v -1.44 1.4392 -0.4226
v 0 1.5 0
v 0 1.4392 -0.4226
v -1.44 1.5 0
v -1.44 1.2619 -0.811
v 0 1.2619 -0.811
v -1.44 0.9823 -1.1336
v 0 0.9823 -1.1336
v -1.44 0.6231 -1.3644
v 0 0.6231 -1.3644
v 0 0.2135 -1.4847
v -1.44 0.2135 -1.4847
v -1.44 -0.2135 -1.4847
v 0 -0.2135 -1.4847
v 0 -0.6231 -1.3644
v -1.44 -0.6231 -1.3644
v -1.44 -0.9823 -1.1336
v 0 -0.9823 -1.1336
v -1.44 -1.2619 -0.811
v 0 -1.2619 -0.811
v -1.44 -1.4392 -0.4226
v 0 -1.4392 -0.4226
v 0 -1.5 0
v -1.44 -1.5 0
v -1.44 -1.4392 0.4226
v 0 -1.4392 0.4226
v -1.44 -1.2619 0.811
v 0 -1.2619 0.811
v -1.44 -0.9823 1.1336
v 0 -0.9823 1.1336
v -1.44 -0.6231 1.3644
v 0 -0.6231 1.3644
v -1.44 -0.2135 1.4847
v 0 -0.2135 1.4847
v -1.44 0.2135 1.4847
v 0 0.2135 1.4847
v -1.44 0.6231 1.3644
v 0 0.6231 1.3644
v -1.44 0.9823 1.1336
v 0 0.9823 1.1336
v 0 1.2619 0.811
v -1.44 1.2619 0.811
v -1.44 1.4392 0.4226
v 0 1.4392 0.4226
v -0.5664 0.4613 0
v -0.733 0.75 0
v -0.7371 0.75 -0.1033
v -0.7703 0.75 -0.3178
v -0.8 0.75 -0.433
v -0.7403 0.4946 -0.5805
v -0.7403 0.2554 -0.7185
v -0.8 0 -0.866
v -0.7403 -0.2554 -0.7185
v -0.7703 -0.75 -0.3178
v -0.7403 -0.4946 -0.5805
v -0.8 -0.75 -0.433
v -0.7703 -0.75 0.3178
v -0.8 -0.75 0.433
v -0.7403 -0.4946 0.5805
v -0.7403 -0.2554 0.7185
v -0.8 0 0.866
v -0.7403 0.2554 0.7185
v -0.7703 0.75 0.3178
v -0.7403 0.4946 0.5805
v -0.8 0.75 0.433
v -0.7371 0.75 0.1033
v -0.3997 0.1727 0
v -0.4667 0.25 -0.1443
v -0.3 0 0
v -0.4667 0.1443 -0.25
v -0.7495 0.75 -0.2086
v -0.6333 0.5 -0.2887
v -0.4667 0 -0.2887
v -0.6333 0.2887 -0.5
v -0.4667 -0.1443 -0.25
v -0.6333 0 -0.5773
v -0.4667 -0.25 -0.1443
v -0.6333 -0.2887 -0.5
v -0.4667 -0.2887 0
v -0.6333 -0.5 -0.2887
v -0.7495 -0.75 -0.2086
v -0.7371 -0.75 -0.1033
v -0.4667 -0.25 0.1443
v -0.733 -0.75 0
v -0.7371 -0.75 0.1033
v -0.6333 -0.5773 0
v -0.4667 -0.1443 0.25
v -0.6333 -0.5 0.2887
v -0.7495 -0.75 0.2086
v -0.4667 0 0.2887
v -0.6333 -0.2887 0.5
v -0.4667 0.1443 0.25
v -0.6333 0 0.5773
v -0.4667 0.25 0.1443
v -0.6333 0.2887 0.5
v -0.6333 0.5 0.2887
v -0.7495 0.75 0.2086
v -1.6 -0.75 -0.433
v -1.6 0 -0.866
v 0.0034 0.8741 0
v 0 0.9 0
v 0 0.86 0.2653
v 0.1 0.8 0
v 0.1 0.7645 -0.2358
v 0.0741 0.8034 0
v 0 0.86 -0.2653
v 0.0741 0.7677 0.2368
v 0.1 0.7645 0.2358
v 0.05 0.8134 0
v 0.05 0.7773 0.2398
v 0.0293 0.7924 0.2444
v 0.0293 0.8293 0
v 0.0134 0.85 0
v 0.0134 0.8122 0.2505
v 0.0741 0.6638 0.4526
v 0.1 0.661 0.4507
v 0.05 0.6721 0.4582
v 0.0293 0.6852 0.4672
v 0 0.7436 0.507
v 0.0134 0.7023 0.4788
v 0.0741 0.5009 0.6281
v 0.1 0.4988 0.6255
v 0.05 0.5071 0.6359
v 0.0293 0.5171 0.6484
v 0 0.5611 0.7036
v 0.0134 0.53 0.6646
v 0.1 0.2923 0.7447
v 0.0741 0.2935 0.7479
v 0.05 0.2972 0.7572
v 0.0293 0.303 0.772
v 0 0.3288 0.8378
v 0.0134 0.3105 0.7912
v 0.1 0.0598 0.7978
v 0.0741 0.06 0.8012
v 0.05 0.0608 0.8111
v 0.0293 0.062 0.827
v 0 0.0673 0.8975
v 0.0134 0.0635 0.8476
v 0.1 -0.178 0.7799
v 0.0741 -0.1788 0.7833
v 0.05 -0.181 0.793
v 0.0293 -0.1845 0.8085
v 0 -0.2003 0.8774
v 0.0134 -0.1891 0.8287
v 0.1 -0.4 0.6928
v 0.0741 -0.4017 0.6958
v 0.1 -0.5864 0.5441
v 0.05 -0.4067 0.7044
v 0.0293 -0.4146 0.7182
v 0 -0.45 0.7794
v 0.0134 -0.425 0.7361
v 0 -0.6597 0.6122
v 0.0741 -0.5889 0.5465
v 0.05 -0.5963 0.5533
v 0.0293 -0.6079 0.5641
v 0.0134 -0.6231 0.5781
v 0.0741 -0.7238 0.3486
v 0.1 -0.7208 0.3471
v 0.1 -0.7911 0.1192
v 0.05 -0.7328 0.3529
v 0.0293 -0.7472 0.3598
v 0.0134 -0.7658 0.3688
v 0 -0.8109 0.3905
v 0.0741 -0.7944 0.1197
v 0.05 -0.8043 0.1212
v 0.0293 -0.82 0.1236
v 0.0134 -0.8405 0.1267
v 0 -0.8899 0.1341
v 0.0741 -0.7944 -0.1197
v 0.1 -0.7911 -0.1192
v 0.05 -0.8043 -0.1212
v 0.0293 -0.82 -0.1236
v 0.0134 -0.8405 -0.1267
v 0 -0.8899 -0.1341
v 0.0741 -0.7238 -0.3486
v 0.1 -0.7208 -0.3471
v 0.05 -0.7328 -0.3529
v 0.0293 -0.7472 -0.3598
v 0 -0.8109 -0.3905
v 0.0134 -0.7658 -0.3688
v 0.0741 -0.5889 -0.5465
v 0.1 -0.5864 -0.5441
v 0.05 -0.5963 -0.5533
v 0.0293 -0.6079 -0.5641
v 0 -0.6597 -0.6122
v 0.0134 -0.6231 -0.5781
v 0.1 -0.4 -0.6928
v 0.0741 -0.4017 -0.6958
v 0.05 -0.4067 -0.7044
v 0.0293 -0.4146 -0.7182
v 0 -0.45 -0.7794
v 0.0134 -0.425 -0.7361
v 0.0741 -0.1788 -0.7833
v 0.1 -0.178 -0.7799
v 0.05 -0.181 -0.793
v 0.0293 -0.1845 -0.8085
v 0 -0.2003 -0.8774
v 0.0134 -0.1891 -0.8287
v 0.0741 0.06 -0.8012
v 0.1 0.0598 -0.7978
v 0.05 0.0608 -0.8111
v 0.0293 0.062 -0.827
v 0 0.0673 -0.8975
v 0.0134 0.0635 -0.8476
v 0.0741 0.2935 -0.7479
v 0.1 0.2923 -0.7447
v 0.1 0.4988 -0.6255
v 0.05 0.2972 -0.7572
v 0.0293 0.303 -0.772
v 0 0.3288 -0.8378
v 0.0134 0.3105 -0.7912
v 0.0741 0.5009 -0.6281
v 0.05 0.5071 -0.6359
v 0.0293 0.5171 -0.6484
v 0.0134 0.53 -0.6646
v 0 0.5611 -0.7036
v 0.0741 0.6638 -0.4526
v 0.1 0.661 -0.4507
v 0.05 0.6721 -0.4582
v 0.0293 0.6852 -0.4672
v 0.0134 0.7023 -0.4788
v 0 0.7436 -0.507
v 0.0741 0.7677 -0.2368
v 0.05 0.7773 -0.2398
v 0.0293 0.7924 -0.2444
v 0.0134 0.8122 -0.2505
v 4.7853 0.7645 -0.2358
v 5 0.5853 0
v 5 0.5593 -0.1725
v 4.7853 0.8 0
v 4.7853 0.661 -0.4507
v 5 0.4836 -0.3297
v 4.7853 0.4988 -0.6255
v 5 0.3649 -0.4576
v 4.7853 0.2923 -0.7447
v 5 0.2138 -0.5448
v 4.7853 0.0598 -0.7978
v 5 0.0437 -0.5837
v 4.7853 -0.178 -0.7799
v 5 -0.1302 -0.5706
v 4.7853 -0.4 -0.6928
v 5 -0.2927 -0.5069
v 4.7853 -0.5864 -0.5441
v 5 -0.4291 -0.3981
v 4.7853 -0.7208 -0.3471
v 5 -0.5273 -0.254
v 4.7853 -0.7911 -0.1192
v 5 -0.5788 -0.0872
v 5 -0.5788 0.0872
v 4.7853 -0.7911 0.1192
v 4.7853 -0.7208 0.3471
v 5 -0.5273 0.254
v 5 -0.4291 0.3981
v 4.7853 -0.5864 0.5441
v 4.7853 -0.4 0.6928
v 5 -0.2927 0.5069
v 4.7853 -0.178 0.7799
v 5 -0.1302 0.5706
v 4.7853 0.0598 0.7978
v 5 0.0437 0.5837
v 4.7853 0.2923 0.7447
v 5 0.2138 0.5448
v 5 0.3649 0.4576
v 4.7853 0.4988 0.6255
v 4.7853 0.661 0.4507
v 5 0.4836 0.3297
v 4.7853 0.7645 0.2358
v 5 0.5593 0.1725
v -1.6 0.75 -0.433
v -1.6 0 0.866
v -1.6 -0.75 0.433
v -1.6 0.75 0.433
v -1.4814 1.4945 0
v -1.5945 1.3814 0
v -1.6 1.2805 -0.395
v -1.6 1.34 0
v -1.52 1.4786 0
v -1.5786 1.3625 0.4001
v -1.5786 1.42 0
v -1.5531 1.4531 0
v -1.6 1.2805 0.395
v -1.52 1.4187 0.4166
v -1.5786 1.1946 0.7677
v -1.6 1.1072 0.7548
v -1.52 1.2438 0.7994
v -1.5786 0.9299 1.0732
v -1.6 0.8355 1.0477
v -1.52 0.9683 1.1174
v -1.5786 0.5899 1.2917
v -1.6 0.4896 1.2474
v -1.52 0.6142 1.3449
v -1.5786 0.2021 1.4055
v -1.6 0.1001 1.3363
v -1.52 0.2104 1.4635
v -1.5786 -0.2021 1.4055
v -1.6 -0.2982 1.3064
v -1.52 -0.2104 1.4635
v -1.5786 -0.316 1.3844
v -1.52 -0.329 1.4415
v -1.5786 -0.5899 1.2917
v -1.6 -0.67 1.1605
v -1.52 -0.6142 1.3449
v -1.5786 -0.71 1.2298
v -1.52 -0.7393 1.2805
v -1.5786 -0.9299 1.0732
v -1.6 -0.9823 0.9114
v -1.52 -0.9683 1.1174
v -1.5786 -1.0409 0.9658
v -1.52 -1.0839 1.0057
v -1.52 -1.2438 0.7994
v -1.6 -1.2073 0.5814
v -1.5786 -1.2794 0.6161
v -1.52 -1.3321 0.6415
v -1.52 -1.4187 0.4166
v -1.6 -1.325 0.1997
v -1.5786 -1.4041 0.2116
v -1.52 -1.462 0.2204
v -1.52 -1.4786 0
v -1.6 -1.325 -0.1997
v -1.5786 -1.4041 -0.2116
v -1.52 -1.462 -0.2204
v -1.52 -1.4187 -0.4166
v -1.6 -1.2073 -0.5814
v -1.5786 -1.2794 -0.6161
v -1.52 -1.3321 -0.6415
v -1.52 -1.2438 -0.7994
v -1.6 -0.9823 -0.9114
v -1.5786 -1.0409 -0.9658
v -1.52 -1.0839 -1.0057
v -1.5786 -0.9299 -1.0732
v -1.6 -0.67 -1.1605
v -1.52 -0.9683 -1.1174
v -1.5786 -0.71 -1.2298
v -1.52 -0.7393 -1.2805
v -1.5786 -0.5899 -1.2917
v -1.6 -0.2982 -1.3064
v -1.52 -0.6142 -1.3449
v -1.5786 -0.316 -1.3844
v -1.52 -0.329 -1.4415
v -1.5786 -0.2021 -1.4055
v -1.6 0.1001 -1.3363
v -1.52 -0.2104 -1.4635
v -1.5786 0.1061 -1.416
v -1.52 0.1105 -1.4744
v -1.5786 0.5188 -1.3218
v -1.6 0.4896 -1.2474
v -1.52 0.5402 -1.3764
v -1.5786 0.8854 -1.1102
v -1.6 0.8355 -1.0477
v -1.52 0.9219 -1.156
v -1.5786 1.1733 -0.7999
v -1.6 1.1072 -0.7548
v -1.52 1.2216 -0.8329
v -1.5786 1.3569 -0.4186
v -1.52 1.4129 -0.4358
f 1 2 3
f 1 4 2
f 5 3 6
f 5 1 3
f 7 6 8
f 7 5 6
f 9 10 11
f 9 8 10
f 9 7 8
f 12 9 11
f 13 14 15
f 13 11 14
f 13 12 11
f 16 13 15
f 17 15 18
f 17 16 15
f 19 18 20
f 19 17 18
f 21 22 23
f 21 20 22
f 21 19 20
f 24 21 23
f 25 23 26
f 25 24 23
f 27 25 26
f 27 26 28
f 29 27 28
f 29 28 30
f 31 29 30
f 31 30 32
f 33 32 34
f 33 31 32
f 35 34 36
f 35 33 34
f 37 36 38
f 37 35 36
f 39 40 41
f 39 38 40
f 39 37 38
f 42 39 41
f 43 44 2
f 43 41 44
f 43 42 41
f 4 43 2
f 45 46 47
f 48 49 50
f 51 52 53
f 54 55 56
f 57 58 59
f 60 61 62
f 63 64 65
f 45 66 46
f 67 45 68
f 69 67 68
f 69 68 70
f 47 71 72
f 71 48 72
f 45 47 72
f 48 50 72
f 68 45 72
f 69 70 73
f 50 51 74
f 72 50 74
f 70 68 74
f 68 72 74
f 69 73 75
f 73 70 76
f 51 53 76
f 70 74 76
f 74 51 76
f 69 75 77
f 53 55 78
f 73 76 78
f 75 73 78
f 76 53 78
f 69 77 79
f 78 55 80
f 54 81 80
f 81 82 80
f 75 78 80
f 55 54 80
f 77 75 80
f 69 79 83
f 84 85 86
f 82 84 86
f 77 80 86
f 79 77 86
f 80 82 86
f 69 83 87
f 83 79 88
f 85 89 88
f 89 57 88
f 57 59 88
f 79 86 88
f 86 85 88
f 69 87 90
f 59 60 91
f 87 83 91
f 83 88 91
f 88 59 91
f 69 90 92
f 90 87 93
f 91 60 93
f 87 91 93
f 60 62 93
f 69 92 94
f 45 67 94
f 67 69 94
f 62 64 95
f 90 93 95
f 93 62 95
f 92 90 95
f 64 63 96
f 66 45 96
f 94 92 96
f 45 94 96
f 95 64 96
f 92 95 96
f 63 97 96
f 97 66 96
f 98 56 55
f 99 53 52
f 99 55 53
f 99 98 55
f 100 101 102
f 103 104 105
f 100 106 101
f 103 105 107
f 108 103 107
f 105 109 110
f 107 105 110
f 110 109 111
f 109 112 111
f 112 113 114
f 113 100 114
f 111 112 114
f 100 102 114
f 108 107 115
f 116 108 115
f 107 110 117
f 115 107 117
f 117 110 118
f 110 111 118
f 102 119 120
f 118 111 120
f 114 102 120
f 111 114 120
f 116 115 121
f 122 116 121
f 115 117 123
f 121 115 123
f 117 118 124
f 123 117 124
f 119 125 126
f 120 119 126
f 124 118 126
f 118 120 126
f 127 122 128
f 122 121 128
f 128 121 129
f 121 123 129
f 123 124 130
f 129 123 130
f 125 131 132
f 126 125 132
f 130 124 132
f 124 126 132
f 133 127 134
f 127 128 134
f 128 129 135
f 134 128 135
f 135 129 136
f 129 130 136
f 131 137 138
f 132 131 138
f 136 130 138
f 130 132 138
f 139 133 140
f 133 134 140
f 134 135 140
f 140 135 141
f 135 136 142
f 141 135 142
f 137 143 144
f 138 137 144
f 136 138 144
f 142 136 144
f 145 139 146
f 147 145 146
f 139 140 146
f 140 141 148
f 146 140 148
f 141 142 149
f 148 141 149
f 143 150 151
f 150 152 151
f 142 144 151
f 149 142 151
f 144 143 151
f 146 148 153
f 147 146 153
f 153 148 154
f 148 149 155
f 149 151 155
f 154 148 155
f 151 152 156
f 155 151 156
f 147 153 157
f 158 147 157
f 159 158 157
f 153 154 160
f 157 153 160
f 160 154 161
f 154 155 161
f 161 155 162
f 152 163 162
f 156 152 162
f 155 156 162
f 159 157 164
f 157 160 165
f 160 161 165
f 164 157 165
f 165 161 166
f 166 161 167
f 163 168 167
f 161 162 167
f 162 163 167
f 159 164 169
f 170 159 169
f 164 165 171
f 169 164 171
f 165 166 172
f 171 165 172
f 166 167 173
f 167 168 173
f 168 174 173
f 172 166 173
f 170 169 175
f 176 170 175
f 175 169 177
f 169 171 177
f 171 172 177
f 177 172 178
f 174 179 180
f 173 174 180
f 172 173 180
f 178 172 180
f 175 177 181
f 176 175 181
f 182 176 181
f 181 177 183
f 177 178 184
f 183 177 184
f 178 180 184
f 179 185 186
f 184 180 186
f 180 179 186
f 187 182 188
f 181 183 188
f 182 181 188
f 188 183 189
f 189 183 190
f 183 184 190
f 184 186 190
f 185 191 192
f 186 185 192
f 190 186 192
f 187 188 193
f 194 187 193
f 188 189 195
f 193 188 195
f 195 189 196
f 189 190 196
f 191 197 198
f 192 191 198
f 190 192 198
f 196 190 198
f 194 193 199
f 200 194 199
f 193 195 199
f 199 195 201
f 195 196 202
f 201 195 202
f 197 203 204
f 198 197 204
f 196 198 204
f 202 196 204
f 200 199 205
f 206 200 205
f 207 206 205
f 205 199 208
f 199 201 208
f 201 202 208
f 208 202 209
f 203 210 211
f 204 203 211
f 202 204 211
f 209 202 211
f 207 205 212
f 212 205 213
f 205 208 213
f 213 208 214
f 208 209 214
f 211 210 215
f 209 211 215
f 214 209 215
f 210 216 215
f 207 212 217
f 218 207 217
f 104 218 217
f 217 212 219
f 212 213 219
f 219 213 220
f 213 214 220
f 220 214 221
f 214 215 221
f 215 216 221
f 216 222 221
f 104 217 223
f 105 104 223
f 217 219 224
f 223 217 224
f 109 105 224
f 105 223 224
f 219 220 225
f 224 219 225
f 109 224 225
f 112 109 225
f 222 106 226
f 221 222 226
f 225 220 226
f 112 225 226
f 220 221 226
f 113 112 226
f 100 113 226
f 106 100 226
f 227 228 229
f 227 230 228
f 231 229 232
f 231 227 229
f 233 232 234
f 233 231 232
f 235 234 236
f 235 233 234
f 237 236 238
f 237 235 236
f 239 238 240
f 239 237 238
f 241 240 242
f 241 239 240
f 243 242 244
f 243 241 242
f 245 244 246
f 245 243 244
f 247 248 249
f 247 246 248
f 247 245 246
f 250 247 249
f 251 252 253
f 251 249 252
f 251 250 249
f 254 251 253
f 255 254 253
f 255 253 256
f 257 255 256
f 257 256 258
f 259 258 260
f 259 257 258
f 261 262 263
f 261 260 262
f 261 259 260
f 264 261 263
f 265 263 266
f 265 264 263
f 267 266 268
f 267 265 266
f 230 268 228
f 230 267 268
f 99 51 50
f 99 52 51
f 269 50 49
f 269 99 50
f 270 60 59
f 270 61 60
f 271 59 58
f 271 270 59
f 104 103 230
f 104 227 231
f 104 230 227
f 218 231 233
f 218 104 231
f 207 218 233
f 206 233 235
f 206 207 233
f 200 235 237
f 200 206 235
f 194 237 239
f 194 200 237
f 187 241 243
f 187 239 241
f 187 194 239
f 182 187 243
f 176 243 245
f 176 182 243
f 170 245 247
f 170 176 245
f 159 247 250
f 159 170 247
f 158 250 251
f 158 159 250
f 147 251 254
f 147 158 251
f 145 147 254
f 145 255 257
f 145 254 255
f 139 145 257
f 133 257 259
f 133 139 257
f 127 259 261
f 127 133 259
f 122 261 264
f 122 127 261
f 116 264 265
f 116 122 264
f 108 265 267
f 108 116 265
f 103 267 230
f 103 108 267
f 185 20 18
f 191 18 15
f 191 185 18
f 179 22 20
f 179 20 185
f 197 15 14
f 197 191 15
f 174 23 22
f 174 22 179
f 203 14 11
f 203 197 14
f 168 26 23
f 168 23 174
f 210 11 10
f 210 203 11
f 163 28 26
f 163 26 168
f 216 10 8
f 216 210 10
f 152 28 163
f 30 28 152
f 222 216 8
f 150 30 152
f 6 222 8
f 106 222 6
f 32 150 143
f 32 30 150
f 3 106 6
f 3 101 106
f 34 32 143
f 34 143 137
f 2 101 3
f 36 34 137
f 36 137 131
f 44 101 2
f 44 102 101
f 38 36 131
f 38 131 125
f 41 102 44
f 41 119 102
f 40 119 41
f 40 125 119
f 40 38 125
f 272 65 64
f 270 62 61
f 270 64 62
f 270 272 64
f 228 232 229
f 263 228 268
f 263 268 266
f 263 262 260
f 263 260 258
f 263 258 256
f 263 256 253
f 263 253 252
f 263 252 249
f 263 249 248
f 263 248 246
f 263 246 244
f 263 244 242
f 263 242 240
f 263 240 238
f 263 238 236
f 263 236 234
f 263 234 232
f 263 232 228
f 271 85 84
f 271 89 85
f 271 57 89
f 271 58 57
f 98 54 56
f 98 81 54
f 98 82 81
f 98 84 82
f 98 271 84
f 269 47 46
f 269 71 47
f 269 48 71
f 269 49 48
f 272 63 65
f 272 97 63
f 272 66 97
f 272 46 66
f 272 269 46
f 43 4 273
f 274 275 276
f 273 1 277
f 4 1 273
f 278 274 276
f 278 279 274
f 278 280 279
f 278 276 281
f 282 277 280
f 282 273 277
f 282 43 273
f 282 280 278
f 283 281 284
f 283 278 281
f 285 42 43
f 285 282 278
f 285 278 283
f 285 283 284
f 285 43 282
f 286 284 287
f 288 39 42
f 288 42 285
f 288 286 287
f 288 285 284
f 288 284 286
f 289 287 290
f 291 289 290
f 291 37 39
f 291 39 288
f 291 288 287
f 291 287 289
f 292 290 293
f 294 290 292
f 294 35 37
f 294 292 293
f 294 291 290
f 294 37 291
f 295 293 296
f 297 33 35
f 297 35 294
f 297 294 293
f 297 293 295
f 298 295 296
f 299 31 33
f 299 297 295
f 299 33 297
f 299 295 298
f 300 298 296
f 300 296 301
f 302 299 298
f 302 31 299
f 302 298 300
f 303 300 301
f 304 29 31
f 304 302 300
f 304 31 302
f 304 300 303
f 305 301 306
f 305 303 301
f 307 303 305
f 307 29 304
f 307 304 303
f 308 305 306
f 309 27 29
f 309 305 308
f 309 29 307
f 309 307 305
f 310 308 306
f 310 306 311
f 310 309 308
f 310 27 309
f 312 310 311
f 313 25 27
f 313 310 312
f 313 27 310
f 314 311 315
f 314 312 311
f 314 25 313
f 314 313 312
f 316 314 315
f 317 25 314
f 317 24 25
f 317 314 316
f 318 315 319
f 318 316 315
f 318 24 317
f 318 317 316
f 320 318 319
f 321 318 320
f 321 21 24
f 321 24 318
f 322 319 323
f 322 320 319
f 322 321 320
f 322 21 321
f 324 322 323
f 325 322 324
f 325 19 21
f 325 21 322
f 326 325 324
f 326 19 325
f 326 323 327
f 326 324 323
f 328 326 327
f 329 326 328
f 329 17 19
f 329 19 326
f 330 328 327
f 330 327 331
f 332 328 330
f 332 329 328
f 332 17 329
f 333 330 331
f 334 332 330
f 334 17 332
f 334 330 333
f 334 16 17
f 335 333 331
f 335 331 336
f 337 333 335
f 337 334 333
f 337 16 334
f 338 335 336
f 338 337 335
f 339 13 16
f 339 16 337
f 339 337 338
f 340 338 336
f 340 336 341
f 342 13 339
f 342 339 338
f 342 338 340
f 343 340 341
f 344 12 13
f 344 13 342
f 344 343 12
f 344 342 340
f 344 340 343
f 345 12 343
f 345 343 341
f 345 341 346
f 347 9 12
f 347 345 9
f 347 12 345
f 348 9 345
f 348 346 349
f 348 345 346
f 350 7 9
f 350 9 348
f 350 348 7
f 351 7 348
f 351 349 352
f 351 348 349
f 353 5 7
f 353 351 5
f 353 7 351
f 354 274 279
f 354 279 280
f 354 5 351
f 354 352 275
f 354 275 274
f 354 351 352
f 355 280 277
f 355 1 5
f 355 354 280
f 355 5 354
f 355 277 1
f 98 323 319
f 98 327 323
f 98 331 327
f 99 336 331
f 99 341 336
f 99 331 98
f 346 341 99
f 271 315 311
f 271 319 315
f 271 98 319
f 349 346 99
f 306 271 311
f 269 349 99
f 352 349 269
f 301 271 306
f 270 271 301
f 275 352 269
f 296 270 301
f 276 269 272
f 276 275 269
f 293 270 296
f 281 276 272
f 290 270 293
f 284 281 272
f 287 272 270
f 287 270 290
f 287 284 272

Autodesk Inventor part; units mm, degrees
ref_plane "YZ Plane" through (0, 0, 0) normal (1, 0, 0) x (0, 1, 0)
ref_plane "XZ Plane" through (0, 0, 0) normal (0, 1, 0) x (-1, 0, 0)
sketch "Sketch1" plane through (0, 0, 0) normal (0, 0, 1) x (1, 0, 0)
  line L0 (-0.3, 0) -> (5, 0)
  line L1 (5, 0) -> (5, 0.8)
  line L2 (5, 0.8) -> (0.9147, 0.8)
  line L3 (0.9147, 0.8) -> (0.6999, 0.8)
  line L4 (0.6999, 0.8) -> (0, 0.8)
  line L5 (0, 0.8) -> (0, 1.5)
  line L6 (0, 1.5) -> (-1.6, 1.5)
  line L7 (-1.6, 1.5) -> (-1.6, 0.866)
  line L8 (-1.6, 0.866) -> (-0.8, 0.866)
  line L9 (-0.8, 0.866) -> (-0.3, 0)
  line L10 (-2.92, 0) -> (6.32, 0) projected
  line L11 (0, -0.3) -> (0, 1.8) projected
  line L12 (0.9147, 0.8) -> (0, 0.8) construction
  dimension "d1" = 4.0853
  dimension "d2" = 0.2148
  dimension "d3" = 1.6
  dimension "d4" = 0.8
  dimension "d5" = 60
  dimension "d6" = 1.6
  dimension "d7" = 1.6
  dimension "d8" = 1.7321
  dimension "d9" = 3
  dimension "d26" = 5
revolve "Body" add sketch "Sketch1" angle 360 about axis through (-0.3, 0, 0) along (1, 0, 0)
sketch "Sketch2" plane through (-1.6, 0, 0) normal (-1, 0, 0) x (0, 0, 1)
  circle A0 centre (0, 0) radius 0.866 projected
  line L0 (0, -2.1) -> (0, 2.1) projected
  line L1 (-2.1, 0) -> (2.1, 0) projected
  line L2 (0.866, 0) -> (0.433, -0.75)
  line L3 (0.433, -0.75) -> (-0.433, -0.75)
  line L4 (-0.433, -0.75) -> (-0.866, 0)
  line L5 (-0.866, 0) -> (-0.433, 0.75)
  line L6 (-0.433, 0.75) -> (0.433, 0.75)
  line L7 (0.433, 0.75) -> (0.866, 0)
extrude "Slot" add sketch "Sketch2" against normal up to next contours L7 A0 | A0 L2 | L6 L0 A0 | A0 L0 L3 | L0 L6 A0 | A0 L3 L0 | L4 A0 | A0 L5
fillet "Fillet1" radius 0.16 1 edges at (-1.6, -1.5, 0)
thread "Thread" size "M1.6x0.35" class "6g" standard "ISO Metric profile" length 4.0853
chamfer "Chamfer1" distance 0.2147 distance2 0.2147 1 edges at (5, -0.8, 0) measured on face at (5, -0.0946, 0.2493)
ref_plane "Work Plane1" through (29, 0, 0) normal (0, -1, 0) x (1, 0, 0)
fillet "Fillet2" radius 0.1 1 edges at (0, -0.8, 0)
equation "\"d1\" = GEL"
equation "\"d3\" = KOH"
equation "\"d4\" = INTI"
equation "\"d6\" = GD"
equation "\"d7\" = BDM"
equation "\"d8\" = 1.1547 * SW"
equation "\"d9\" = KOD"
equation "\"d26\" = NLG"
equation "\"d30\" = R"
equation "\"d17\" = RR"
equation "\"d13\" = GEL"
equation "\"d15\" = -0.5 * SPD + 0.5 * GD"
equation "\"d16\" = GUL"
equation "\"GD\" = NND"
equation "\"NLG\" = 5"
equation "\"GEL\" = 4.08529"
equation "\"KOD\" = 3"
equation "\"KOH\" = 1.6"
equation "\"INTI\" = 0.8"
equation "\"GAL\" = 0.61345 * PTC"
equation "\"GUL\" = 0.61345 * PTC"
equation "\"BDM\" = NND"
equation "\"SW\" = 1.5"
equation "\"RR\" = 0.16"
equation "\"SPD\" = 1.17058"
equation "\"R\" = 0.1"
equation "\"TOA\" = 30deg"
equation "\"THREADDIA\" = 1.6"
equation "\"PTC\" = 0.35"
equation "\"NND\" = 1.6"
equation "\"E0\" = 1.155 * SW"
equation "\"GD1\" = THREADDIA - 1.2269 * PTC"
properties part number "ANSI B18.3.1M - M1.6x0.35 x 5, FSHCSM" material "Steel, Mild"
